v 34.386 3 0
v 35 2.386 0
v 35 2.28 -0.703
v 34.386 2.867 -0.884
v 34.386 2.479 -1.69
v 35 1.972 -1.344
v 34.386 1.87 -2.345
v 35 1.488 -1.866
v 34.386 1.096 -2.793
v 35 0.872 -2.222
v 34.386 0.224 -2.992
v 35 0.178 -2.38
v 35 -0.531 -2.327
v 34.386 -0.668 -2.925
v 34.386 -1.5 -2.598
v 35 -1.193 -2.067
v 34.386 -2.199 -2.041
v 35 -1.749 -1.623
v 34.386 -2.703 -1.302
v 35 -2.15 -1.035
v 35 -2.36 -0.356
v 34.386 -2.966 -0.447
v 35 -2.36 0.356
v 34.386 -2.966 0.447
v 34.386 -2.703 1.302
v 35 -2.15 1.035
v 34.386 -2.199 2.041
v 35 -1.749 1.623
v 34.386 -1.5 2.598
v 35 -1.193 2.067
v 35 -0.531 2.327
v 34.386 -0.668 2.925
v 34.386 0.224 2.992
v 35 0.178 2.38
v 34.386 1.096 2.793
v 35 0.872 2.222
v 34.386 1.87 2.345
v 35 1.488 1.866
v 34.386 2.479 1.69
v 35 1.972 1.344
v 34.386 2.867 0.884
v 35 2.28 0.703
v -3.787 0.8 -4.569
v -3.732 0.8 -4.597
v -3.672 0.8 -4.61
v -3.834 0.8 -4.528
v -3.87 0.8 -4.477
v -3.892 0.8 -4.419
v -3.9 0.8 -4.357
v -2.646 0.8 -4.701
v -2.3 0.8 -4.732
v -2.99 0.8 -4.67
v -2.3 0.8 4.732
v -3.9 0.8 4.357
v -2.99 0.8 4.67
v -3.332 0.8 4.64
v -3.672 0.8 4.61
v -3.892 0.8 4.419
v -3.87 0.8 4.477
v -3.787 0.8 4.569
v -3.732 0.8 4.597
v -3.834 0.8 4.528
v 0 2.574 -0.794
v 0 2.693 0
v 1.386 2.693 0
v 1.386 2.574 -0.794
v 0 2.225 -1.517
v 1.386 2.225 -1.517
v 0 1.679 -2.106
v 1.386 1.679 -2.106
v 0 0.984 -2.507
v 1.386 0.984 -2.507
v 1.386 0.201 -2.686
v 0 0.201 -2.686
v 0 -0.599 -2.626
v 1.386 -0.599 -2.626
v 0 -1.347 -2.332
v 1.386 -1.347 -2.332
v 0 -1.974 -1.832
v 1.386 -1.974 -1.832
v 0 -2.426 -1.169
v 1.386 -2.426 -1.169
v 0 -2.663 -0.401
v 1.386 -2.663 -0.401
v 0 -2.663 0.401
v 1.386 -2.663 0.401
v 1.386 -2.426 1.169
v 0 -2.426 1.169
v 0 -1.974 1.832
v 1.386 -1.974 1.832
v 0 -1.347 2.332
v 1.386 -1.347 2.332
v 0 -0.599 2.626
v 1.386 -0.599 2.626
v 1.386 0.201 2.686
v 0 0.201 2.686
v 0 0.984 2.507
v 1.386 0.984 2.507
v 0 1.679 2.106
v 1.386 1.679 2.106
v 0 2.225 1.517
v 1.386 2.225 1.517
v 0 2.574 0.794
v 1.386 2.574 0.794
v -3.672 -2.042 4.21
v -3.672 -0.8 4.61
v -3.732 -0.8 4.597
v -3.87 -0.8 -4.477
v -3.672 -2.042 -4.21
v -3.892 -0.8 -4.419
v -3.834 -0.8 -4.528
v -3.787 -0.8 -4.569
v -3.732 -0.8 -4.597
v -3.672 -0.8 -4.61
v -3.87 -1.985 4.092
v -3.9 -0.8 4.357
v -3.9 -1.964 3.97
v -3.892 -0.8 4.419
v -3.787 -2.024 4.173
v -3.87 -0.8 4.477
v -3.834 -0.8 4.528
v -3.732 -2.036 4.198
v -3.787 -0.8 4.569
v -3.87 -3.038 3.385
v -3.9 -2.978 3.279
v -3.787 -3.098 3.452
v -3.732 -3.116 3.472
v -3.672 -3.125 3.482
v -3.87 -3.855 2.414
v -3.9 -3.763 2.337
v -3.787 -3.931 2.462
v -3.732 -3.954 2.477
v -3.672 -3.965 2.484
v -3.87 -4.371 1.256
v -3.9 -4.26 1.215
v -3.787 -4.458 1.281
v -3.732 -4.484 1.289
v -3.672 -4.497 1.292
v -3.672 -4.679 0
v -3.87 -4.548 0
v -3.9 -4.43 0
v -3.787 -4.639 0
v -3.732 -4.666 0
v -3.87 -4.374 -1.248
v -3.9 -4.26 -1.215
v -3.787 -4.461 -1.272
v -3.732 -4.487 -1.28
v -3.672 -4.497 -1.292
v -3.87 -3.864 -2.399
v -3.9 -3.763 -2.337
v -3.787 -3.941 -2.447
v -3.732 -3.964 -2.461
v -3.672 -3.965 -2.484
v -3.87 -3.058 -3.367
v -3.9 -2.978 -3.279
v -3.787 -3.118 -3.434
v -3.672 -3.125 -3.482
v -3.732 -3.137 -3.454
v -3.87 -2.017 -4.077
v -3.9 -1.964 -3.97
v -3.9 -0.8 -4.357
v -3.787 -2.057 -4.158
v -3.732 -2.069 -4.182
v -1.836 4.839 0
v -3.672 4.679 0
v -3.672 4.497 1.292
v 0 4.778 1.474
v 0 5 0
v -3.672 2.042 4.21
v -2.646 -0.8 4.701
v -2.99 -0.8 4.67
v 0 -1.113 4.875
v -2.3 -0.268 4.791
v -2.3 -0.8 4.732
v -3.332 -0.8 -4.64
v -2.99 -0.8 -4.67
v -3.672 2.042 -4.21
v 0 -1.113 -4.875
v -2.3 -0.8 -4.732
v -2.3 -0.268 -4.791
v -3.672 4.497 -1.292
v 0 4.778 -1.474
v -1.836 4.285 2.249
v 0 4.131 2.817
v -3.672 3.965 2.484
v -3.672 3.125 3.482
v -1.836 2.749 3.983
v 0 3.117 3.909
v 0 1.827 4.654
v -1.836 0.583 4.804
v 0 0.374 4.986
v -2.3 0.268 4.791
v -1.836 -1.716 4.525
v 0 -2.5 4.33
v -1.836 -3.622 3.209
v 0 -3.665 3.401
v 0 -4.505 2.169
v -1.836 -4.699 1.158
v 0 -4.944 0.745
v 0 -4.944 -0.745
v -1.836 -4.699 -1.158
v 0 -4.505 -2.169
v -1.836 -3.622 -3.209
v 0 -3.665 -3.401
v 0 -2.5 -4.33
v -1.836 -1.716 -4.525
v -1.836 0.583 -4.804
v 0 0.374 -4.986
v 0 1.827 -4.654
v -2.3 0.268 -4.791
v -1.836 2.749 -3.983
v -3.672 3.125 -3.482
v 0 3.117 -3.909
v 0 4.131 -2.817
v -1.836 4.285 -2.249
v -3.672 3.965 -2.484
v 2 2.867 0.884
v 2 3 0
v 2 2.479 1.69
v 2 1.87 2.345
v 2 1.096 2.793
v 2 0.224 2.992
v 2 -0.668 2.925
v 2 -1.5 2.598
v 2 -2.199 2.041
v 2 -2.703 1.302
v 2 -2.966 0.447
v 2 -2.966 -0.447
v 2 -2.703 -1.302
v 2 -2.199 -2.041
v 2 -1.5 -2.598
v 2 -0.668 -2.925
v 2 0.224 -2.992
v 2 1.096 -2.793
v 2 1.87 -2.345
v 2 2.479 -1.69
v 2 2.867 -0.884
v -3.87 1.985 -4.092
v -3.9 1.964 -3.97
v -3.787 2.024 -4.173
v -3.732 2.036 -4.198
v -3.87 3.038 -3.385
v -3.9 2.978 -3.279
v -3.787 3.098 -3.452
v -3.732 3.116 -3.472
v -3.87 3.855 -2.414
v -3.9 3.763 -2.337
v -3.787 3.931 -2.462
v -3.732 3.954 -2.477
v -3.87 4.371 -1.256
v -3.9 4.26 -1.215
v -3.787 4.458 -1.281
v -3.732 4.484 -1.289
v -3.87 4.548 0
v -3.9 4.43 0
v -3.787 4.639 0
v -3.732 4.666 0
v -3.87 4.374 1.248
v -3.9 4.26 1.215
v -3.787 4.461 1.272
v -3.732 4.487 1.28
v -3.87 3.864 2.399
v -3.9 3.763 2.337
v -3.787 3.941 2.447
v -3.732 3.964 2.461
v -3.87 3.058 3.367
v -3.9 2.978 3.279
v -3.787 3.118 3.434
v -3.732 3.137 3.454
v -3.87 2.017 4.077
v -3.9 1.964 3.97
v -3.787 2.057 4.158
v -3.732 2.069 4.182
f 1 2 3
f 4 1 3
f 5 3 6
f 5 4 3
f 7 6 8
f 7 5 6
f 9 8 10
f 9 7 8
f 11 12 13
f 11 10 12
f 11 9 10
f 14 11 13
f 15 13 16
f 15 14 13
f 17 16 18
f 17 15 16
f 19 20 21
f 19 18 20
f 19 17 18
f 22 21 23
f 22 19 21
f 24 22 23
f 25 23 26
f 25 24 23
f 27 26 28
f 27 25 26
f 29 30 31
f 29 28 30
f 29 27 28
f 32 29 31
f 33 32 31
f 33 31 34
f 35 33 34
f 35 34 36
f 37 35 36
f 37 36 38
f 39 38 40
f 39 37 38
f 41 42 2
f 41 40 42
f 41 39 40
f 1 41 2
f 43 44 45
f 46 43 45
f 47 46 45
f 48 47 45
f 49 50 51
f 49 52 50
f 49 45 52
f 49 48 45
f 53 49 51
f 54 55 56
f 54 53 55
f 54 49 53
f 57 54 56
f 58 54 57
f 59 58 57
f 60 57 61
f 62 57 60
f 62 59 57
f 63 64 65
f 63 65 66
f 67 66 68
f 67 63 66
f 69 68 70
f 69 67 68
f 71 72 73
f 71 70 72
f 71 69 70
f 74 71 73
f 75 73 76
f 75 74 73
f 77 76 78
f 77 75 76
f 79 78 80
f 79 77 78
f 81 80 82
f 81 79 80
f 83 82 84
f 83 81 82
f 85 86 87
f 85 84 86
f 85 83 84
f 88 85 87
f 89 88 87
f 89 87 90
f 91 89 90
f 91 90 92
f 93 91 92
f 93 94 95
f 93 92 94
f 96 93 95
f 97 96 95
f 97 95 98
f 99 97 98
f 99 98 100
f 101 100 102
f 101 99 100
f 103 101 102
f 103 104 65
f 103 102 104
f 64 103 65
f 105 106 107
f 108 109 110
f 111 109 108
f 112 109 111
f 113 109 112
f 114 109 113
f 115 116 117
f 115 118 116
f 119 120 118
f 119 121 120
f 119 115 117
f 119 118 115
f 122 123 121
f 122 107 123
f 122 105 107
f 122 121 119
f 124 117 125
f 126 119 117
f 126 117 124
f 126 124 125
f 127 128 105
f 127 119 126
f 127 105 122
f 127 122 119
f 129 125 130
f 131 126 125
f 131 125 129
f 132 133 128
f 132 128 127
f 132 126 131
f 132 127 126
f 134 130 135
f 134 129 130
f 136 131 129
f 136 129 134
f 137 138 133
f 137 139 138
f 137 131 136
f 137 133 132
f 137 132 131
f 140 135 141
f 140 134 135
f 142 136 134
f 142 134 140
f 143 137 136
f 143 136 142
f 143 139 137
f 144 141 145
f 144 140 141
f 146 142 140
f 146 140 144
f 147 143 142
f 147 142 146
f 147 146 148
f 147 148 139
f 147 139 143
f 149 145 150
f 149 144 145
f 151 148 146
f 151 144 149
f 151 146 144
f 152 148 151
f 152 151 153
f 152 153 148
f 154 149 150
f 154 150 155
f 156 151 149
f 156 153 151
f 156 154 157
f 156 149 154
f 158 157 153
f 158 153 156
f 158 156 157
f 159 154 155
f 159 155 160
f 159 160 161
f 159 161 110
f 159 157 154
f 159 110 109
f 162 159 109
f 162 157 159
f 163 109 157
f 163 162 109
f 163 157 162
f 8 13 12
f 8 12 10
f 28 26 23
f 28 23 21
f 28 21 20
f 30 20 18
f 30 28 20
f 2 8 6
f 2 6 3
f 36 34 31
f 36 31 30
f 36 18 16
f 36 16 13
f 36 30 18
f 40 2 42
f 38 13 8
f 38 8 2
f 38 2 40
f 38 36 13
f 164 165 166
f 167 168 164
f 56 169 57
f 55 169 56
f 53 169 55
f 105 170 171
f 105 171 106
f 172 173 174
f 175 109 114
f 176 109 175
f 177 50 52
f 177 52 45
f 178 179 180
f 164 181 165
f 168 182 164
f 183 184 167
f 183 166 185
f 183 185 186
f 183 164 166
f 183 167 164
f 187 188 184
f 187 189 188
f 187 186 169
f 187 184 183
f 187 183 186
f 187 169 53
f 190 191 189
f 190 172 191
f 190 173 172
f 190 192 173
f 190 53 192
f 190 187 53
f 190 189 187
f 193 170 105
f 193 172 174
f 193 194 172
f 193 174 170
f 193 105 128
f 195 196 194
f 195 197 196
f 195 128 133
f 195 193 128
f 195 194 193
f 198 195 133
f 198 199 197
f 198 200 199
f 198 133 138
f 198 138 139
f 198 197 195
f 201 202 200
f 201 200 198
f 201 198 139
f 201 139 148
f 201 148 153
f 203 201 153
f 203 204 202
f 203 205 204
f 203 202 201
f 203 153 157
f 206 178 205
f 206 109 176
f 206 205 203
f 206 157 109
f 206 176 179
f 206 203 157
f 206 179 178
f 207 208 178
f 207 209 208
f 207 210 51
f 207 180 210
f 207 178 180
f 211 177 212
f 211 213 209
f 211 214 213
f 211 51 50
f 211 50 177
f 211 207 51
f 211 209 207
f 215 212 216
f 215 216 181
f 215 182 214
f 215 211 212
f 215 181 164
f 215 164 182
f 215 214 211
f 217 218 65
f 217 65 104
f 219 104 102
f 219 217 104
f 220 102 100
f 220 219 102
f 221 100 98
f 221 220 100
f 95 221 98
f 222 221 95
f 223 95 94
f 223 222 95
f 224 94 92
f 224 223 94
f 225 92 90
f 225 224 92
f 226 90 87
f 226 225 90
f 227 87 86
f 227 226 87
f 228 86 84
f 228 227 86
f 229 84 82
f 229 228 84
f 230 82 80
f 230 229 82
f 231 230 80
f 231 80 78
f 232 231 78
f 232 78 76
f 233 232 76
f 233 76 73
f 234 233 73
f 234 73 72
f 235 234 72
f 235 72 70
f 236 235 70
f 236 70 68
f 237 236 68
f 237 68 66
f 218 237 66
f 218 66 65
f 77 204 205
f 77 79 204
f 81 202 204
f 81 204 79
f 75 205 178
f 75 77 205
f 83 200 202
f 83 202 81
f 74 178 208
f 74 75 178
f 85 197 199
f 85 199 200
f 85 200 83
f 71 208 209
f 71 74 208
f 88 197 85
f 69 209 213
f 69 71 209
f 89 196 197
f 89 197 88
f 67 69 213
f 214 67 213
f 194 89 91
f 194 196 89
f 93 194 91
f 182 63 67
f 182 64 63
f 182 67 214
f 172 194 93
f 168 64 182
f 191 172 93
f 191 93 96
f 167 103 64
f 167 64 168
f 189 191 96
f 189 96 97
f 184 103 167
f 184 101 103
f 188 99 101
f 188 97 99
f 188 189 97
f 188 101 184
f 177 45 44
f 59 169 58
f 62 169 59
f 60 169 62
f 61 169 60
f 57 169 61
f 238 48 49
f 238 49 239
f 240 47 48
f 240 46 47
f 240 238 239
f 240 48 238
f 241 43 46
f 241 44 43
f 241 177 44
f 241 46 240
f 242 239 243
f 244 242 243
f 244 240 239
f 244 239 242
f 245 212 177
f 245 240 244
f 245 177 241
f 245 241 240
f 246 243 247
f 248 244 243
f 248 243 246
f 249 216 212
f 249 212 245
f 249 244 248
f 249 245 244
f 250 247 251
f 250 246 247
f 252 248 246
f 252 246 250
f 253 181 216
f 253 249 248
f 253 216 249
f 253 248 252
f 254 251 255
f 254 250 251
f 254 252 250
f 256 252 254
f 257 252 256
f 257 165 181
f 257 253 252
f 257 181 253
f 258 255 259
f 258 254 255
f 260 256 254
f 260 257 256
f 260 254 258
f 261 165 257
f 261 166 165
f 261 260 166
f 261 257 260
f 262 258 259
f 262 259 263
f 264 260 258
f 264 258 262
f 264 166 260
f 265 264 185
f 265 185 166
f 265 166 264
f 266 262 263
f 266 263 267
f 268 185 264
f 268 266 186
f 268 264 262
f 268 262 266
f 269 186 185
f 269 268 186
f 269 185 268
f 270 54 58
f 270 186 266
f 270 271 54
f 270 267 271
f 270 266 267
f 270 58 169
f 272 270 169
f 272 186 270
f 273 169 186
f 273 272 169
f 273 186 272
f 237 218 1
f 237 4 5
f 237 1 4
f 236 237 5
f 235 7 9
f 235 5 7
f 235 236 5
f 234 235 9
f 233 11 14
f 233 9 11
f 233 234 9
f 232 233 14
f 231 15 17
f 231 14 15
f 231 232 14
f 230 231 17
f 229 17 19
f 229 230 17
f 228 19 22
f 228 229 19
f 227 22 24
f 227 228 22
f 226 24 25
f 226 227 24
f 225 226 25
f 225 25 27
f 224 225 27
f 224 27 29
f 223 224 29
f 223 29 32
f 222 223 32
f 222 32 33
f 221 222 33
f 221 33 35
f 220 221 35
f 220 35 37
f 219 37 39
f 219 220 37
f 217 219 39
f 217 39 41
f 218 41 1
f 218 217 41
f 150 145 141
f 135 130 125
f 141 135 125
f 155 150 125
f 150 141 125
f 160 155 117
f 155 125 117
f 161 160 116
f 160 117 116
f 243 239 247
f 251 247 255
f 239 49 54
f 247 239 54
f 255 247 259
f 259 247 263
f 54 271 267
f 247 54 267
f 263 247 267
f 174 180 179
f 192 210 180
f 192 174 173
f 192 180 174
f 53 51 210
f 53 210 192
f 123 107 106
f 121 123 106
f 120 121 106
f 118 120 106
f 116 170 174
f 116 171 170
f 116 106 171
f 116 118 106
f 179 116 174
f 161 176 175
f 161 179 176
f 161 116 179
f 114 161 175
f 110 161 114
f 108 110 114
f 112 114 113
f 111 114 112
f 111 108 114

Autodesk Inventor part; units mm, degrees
ref_plane "YZ Plane" through (0, 0, 0) normal (1, 0, 0) x (0, 1, 0)
ref_plane "XZ Plane" through (0, 0, 0) normal (0, 1, 0) x (-1, 0, 0)
sketch "Sketch1" plane through (0, 0, 0) normal (0, 0, 1) x (1, 0, 0)
  line L0 (-3.9, 0) -> (35, 0)
  line L1 (35, 0) -> (35, 3)
  line L2 (35, 3) -> (2, 3)
  line L3 (2, 3) -> (1.3864, 2.6932)
  line L4 (1.3864, 2.6932) -> (0, 2.6932)
  line L5 (0, 2.6932) -> (0, 5)
  line L6 (-11.68, 0) -> (42.78, 0) projected
  line L7 (0, -1) -> (0, 6) projected
  line L8 (-3.9, 0) -> (-3.9, 4.6588)
  line L9 (0, 5) -> (-3.9, 4.6588)
  line L10 (2, 3) -> (0, 3) construction
  dimension "d0" = 35
  dimension "d1" = 33
  dimension "d2" = 0.6136
  dimension "d3" = 3.9
  dimension "d4" = 6
  dimension "d5" = 5.3865
  dimension "d9" = 10
  dimension "d10" = 5
revolve "Body" add sketch "Sketch1" angle 360 about axis through (-3.9, 0, 0) along (1, 0, 0)
sketch "Sketch2" plane through (-3.9, 0, 0) normal (-1, 0, 0) x (0, 0, 1)
  circle A0 centre (0, 0) radius 5 projected
  line L0 (0, 0) -> (0, 4.6588) projected
  line L1 (-5, 0.8) -> (5, 0.8)
  line L2 (5, 0.8) -> (5, -0.8)
  line L3 (5, -0.8) -> (-5, -0.8)
  line L4 (-5, -0.8) -> (-5, 0.8)
  line L5 (-5, 0) -> (5, 0) construction
  line L6 (0, 0.8) -> (0, -0.8) construction
  dimension "d11" = 1.6
  dimension "d12" = 10
fillet "Fillet1" radius 0.25 1 edges at (-3.9, -4.6588, 0)
extrude "Slot" cut sketch "Sketch2" against normal blind 1.6 contours A0 L3 L1 | L2 L3 A0 | A0 L1 L2 | A0 L4 L1 | L3 L4 A0
thread "Thread" size "M6x1" class "6g" standard "ISO Metric profile" length 33
chamfer "Chamfer1" distance 0.6135 distance2 0.6136 1 edges at (35, -3, 0) measured on face at (35, 0.7485, -0.6631)
ref_plane "Work Plane1" through (30.1625, 0, 0) normal (0, 0, -1) x (1, 0, 0)
equation "\"d11\" = SBR"
equation "\"d12\" = KOD"
equation "\"d14\" = RR"
equation "\"d19\" = STI"
equation "\"d15\" = GEL"
equation "\"d17\" = -0.5 * SPD + 0.5 * GD"
equation "\"d0\" = NLG"
equation "\"d1\" = GEL"
equation "\"d3\" = KOH"
equation "\"d4\" = GD"
equation "\"d5\" = BDM"
equation "\"d9\" = KOD"
equation "\"d10\" = KEWI"
equation "\"GD\" = NND"
equation "\"NLG\" = 35"
equation "\"GEL\" = 33"
equation "\"KOD\" = 10"
equation "\"KOH\" = 3.9"
equation "\"GAL\" = 0.61345 * PTC"
equation "\"SPD\" = NND - 1.2269 * PTC"
equation "\"BDM\" = 5.3865"
equation "\"GUL\" = 0.61345 * PTC"
equation "\"RR\" = 0.25"
equation "\"SBR\" = 1.6"
equation "\"STI\" = 1.6"
equation "\"KEWI\" = 5deg"
equation "\"PTC\" = 1"
equation "\"THREADDIA\" = 6"
equation "\"TOA\" = 30deg"
equation "\"NND\" = 6"
equation "\"GD1\" = THREADDIA - 1.2269 * PTC"
properties part number "ISO 1207 - M6 x 35" material "Stainless Steel, 440C"
